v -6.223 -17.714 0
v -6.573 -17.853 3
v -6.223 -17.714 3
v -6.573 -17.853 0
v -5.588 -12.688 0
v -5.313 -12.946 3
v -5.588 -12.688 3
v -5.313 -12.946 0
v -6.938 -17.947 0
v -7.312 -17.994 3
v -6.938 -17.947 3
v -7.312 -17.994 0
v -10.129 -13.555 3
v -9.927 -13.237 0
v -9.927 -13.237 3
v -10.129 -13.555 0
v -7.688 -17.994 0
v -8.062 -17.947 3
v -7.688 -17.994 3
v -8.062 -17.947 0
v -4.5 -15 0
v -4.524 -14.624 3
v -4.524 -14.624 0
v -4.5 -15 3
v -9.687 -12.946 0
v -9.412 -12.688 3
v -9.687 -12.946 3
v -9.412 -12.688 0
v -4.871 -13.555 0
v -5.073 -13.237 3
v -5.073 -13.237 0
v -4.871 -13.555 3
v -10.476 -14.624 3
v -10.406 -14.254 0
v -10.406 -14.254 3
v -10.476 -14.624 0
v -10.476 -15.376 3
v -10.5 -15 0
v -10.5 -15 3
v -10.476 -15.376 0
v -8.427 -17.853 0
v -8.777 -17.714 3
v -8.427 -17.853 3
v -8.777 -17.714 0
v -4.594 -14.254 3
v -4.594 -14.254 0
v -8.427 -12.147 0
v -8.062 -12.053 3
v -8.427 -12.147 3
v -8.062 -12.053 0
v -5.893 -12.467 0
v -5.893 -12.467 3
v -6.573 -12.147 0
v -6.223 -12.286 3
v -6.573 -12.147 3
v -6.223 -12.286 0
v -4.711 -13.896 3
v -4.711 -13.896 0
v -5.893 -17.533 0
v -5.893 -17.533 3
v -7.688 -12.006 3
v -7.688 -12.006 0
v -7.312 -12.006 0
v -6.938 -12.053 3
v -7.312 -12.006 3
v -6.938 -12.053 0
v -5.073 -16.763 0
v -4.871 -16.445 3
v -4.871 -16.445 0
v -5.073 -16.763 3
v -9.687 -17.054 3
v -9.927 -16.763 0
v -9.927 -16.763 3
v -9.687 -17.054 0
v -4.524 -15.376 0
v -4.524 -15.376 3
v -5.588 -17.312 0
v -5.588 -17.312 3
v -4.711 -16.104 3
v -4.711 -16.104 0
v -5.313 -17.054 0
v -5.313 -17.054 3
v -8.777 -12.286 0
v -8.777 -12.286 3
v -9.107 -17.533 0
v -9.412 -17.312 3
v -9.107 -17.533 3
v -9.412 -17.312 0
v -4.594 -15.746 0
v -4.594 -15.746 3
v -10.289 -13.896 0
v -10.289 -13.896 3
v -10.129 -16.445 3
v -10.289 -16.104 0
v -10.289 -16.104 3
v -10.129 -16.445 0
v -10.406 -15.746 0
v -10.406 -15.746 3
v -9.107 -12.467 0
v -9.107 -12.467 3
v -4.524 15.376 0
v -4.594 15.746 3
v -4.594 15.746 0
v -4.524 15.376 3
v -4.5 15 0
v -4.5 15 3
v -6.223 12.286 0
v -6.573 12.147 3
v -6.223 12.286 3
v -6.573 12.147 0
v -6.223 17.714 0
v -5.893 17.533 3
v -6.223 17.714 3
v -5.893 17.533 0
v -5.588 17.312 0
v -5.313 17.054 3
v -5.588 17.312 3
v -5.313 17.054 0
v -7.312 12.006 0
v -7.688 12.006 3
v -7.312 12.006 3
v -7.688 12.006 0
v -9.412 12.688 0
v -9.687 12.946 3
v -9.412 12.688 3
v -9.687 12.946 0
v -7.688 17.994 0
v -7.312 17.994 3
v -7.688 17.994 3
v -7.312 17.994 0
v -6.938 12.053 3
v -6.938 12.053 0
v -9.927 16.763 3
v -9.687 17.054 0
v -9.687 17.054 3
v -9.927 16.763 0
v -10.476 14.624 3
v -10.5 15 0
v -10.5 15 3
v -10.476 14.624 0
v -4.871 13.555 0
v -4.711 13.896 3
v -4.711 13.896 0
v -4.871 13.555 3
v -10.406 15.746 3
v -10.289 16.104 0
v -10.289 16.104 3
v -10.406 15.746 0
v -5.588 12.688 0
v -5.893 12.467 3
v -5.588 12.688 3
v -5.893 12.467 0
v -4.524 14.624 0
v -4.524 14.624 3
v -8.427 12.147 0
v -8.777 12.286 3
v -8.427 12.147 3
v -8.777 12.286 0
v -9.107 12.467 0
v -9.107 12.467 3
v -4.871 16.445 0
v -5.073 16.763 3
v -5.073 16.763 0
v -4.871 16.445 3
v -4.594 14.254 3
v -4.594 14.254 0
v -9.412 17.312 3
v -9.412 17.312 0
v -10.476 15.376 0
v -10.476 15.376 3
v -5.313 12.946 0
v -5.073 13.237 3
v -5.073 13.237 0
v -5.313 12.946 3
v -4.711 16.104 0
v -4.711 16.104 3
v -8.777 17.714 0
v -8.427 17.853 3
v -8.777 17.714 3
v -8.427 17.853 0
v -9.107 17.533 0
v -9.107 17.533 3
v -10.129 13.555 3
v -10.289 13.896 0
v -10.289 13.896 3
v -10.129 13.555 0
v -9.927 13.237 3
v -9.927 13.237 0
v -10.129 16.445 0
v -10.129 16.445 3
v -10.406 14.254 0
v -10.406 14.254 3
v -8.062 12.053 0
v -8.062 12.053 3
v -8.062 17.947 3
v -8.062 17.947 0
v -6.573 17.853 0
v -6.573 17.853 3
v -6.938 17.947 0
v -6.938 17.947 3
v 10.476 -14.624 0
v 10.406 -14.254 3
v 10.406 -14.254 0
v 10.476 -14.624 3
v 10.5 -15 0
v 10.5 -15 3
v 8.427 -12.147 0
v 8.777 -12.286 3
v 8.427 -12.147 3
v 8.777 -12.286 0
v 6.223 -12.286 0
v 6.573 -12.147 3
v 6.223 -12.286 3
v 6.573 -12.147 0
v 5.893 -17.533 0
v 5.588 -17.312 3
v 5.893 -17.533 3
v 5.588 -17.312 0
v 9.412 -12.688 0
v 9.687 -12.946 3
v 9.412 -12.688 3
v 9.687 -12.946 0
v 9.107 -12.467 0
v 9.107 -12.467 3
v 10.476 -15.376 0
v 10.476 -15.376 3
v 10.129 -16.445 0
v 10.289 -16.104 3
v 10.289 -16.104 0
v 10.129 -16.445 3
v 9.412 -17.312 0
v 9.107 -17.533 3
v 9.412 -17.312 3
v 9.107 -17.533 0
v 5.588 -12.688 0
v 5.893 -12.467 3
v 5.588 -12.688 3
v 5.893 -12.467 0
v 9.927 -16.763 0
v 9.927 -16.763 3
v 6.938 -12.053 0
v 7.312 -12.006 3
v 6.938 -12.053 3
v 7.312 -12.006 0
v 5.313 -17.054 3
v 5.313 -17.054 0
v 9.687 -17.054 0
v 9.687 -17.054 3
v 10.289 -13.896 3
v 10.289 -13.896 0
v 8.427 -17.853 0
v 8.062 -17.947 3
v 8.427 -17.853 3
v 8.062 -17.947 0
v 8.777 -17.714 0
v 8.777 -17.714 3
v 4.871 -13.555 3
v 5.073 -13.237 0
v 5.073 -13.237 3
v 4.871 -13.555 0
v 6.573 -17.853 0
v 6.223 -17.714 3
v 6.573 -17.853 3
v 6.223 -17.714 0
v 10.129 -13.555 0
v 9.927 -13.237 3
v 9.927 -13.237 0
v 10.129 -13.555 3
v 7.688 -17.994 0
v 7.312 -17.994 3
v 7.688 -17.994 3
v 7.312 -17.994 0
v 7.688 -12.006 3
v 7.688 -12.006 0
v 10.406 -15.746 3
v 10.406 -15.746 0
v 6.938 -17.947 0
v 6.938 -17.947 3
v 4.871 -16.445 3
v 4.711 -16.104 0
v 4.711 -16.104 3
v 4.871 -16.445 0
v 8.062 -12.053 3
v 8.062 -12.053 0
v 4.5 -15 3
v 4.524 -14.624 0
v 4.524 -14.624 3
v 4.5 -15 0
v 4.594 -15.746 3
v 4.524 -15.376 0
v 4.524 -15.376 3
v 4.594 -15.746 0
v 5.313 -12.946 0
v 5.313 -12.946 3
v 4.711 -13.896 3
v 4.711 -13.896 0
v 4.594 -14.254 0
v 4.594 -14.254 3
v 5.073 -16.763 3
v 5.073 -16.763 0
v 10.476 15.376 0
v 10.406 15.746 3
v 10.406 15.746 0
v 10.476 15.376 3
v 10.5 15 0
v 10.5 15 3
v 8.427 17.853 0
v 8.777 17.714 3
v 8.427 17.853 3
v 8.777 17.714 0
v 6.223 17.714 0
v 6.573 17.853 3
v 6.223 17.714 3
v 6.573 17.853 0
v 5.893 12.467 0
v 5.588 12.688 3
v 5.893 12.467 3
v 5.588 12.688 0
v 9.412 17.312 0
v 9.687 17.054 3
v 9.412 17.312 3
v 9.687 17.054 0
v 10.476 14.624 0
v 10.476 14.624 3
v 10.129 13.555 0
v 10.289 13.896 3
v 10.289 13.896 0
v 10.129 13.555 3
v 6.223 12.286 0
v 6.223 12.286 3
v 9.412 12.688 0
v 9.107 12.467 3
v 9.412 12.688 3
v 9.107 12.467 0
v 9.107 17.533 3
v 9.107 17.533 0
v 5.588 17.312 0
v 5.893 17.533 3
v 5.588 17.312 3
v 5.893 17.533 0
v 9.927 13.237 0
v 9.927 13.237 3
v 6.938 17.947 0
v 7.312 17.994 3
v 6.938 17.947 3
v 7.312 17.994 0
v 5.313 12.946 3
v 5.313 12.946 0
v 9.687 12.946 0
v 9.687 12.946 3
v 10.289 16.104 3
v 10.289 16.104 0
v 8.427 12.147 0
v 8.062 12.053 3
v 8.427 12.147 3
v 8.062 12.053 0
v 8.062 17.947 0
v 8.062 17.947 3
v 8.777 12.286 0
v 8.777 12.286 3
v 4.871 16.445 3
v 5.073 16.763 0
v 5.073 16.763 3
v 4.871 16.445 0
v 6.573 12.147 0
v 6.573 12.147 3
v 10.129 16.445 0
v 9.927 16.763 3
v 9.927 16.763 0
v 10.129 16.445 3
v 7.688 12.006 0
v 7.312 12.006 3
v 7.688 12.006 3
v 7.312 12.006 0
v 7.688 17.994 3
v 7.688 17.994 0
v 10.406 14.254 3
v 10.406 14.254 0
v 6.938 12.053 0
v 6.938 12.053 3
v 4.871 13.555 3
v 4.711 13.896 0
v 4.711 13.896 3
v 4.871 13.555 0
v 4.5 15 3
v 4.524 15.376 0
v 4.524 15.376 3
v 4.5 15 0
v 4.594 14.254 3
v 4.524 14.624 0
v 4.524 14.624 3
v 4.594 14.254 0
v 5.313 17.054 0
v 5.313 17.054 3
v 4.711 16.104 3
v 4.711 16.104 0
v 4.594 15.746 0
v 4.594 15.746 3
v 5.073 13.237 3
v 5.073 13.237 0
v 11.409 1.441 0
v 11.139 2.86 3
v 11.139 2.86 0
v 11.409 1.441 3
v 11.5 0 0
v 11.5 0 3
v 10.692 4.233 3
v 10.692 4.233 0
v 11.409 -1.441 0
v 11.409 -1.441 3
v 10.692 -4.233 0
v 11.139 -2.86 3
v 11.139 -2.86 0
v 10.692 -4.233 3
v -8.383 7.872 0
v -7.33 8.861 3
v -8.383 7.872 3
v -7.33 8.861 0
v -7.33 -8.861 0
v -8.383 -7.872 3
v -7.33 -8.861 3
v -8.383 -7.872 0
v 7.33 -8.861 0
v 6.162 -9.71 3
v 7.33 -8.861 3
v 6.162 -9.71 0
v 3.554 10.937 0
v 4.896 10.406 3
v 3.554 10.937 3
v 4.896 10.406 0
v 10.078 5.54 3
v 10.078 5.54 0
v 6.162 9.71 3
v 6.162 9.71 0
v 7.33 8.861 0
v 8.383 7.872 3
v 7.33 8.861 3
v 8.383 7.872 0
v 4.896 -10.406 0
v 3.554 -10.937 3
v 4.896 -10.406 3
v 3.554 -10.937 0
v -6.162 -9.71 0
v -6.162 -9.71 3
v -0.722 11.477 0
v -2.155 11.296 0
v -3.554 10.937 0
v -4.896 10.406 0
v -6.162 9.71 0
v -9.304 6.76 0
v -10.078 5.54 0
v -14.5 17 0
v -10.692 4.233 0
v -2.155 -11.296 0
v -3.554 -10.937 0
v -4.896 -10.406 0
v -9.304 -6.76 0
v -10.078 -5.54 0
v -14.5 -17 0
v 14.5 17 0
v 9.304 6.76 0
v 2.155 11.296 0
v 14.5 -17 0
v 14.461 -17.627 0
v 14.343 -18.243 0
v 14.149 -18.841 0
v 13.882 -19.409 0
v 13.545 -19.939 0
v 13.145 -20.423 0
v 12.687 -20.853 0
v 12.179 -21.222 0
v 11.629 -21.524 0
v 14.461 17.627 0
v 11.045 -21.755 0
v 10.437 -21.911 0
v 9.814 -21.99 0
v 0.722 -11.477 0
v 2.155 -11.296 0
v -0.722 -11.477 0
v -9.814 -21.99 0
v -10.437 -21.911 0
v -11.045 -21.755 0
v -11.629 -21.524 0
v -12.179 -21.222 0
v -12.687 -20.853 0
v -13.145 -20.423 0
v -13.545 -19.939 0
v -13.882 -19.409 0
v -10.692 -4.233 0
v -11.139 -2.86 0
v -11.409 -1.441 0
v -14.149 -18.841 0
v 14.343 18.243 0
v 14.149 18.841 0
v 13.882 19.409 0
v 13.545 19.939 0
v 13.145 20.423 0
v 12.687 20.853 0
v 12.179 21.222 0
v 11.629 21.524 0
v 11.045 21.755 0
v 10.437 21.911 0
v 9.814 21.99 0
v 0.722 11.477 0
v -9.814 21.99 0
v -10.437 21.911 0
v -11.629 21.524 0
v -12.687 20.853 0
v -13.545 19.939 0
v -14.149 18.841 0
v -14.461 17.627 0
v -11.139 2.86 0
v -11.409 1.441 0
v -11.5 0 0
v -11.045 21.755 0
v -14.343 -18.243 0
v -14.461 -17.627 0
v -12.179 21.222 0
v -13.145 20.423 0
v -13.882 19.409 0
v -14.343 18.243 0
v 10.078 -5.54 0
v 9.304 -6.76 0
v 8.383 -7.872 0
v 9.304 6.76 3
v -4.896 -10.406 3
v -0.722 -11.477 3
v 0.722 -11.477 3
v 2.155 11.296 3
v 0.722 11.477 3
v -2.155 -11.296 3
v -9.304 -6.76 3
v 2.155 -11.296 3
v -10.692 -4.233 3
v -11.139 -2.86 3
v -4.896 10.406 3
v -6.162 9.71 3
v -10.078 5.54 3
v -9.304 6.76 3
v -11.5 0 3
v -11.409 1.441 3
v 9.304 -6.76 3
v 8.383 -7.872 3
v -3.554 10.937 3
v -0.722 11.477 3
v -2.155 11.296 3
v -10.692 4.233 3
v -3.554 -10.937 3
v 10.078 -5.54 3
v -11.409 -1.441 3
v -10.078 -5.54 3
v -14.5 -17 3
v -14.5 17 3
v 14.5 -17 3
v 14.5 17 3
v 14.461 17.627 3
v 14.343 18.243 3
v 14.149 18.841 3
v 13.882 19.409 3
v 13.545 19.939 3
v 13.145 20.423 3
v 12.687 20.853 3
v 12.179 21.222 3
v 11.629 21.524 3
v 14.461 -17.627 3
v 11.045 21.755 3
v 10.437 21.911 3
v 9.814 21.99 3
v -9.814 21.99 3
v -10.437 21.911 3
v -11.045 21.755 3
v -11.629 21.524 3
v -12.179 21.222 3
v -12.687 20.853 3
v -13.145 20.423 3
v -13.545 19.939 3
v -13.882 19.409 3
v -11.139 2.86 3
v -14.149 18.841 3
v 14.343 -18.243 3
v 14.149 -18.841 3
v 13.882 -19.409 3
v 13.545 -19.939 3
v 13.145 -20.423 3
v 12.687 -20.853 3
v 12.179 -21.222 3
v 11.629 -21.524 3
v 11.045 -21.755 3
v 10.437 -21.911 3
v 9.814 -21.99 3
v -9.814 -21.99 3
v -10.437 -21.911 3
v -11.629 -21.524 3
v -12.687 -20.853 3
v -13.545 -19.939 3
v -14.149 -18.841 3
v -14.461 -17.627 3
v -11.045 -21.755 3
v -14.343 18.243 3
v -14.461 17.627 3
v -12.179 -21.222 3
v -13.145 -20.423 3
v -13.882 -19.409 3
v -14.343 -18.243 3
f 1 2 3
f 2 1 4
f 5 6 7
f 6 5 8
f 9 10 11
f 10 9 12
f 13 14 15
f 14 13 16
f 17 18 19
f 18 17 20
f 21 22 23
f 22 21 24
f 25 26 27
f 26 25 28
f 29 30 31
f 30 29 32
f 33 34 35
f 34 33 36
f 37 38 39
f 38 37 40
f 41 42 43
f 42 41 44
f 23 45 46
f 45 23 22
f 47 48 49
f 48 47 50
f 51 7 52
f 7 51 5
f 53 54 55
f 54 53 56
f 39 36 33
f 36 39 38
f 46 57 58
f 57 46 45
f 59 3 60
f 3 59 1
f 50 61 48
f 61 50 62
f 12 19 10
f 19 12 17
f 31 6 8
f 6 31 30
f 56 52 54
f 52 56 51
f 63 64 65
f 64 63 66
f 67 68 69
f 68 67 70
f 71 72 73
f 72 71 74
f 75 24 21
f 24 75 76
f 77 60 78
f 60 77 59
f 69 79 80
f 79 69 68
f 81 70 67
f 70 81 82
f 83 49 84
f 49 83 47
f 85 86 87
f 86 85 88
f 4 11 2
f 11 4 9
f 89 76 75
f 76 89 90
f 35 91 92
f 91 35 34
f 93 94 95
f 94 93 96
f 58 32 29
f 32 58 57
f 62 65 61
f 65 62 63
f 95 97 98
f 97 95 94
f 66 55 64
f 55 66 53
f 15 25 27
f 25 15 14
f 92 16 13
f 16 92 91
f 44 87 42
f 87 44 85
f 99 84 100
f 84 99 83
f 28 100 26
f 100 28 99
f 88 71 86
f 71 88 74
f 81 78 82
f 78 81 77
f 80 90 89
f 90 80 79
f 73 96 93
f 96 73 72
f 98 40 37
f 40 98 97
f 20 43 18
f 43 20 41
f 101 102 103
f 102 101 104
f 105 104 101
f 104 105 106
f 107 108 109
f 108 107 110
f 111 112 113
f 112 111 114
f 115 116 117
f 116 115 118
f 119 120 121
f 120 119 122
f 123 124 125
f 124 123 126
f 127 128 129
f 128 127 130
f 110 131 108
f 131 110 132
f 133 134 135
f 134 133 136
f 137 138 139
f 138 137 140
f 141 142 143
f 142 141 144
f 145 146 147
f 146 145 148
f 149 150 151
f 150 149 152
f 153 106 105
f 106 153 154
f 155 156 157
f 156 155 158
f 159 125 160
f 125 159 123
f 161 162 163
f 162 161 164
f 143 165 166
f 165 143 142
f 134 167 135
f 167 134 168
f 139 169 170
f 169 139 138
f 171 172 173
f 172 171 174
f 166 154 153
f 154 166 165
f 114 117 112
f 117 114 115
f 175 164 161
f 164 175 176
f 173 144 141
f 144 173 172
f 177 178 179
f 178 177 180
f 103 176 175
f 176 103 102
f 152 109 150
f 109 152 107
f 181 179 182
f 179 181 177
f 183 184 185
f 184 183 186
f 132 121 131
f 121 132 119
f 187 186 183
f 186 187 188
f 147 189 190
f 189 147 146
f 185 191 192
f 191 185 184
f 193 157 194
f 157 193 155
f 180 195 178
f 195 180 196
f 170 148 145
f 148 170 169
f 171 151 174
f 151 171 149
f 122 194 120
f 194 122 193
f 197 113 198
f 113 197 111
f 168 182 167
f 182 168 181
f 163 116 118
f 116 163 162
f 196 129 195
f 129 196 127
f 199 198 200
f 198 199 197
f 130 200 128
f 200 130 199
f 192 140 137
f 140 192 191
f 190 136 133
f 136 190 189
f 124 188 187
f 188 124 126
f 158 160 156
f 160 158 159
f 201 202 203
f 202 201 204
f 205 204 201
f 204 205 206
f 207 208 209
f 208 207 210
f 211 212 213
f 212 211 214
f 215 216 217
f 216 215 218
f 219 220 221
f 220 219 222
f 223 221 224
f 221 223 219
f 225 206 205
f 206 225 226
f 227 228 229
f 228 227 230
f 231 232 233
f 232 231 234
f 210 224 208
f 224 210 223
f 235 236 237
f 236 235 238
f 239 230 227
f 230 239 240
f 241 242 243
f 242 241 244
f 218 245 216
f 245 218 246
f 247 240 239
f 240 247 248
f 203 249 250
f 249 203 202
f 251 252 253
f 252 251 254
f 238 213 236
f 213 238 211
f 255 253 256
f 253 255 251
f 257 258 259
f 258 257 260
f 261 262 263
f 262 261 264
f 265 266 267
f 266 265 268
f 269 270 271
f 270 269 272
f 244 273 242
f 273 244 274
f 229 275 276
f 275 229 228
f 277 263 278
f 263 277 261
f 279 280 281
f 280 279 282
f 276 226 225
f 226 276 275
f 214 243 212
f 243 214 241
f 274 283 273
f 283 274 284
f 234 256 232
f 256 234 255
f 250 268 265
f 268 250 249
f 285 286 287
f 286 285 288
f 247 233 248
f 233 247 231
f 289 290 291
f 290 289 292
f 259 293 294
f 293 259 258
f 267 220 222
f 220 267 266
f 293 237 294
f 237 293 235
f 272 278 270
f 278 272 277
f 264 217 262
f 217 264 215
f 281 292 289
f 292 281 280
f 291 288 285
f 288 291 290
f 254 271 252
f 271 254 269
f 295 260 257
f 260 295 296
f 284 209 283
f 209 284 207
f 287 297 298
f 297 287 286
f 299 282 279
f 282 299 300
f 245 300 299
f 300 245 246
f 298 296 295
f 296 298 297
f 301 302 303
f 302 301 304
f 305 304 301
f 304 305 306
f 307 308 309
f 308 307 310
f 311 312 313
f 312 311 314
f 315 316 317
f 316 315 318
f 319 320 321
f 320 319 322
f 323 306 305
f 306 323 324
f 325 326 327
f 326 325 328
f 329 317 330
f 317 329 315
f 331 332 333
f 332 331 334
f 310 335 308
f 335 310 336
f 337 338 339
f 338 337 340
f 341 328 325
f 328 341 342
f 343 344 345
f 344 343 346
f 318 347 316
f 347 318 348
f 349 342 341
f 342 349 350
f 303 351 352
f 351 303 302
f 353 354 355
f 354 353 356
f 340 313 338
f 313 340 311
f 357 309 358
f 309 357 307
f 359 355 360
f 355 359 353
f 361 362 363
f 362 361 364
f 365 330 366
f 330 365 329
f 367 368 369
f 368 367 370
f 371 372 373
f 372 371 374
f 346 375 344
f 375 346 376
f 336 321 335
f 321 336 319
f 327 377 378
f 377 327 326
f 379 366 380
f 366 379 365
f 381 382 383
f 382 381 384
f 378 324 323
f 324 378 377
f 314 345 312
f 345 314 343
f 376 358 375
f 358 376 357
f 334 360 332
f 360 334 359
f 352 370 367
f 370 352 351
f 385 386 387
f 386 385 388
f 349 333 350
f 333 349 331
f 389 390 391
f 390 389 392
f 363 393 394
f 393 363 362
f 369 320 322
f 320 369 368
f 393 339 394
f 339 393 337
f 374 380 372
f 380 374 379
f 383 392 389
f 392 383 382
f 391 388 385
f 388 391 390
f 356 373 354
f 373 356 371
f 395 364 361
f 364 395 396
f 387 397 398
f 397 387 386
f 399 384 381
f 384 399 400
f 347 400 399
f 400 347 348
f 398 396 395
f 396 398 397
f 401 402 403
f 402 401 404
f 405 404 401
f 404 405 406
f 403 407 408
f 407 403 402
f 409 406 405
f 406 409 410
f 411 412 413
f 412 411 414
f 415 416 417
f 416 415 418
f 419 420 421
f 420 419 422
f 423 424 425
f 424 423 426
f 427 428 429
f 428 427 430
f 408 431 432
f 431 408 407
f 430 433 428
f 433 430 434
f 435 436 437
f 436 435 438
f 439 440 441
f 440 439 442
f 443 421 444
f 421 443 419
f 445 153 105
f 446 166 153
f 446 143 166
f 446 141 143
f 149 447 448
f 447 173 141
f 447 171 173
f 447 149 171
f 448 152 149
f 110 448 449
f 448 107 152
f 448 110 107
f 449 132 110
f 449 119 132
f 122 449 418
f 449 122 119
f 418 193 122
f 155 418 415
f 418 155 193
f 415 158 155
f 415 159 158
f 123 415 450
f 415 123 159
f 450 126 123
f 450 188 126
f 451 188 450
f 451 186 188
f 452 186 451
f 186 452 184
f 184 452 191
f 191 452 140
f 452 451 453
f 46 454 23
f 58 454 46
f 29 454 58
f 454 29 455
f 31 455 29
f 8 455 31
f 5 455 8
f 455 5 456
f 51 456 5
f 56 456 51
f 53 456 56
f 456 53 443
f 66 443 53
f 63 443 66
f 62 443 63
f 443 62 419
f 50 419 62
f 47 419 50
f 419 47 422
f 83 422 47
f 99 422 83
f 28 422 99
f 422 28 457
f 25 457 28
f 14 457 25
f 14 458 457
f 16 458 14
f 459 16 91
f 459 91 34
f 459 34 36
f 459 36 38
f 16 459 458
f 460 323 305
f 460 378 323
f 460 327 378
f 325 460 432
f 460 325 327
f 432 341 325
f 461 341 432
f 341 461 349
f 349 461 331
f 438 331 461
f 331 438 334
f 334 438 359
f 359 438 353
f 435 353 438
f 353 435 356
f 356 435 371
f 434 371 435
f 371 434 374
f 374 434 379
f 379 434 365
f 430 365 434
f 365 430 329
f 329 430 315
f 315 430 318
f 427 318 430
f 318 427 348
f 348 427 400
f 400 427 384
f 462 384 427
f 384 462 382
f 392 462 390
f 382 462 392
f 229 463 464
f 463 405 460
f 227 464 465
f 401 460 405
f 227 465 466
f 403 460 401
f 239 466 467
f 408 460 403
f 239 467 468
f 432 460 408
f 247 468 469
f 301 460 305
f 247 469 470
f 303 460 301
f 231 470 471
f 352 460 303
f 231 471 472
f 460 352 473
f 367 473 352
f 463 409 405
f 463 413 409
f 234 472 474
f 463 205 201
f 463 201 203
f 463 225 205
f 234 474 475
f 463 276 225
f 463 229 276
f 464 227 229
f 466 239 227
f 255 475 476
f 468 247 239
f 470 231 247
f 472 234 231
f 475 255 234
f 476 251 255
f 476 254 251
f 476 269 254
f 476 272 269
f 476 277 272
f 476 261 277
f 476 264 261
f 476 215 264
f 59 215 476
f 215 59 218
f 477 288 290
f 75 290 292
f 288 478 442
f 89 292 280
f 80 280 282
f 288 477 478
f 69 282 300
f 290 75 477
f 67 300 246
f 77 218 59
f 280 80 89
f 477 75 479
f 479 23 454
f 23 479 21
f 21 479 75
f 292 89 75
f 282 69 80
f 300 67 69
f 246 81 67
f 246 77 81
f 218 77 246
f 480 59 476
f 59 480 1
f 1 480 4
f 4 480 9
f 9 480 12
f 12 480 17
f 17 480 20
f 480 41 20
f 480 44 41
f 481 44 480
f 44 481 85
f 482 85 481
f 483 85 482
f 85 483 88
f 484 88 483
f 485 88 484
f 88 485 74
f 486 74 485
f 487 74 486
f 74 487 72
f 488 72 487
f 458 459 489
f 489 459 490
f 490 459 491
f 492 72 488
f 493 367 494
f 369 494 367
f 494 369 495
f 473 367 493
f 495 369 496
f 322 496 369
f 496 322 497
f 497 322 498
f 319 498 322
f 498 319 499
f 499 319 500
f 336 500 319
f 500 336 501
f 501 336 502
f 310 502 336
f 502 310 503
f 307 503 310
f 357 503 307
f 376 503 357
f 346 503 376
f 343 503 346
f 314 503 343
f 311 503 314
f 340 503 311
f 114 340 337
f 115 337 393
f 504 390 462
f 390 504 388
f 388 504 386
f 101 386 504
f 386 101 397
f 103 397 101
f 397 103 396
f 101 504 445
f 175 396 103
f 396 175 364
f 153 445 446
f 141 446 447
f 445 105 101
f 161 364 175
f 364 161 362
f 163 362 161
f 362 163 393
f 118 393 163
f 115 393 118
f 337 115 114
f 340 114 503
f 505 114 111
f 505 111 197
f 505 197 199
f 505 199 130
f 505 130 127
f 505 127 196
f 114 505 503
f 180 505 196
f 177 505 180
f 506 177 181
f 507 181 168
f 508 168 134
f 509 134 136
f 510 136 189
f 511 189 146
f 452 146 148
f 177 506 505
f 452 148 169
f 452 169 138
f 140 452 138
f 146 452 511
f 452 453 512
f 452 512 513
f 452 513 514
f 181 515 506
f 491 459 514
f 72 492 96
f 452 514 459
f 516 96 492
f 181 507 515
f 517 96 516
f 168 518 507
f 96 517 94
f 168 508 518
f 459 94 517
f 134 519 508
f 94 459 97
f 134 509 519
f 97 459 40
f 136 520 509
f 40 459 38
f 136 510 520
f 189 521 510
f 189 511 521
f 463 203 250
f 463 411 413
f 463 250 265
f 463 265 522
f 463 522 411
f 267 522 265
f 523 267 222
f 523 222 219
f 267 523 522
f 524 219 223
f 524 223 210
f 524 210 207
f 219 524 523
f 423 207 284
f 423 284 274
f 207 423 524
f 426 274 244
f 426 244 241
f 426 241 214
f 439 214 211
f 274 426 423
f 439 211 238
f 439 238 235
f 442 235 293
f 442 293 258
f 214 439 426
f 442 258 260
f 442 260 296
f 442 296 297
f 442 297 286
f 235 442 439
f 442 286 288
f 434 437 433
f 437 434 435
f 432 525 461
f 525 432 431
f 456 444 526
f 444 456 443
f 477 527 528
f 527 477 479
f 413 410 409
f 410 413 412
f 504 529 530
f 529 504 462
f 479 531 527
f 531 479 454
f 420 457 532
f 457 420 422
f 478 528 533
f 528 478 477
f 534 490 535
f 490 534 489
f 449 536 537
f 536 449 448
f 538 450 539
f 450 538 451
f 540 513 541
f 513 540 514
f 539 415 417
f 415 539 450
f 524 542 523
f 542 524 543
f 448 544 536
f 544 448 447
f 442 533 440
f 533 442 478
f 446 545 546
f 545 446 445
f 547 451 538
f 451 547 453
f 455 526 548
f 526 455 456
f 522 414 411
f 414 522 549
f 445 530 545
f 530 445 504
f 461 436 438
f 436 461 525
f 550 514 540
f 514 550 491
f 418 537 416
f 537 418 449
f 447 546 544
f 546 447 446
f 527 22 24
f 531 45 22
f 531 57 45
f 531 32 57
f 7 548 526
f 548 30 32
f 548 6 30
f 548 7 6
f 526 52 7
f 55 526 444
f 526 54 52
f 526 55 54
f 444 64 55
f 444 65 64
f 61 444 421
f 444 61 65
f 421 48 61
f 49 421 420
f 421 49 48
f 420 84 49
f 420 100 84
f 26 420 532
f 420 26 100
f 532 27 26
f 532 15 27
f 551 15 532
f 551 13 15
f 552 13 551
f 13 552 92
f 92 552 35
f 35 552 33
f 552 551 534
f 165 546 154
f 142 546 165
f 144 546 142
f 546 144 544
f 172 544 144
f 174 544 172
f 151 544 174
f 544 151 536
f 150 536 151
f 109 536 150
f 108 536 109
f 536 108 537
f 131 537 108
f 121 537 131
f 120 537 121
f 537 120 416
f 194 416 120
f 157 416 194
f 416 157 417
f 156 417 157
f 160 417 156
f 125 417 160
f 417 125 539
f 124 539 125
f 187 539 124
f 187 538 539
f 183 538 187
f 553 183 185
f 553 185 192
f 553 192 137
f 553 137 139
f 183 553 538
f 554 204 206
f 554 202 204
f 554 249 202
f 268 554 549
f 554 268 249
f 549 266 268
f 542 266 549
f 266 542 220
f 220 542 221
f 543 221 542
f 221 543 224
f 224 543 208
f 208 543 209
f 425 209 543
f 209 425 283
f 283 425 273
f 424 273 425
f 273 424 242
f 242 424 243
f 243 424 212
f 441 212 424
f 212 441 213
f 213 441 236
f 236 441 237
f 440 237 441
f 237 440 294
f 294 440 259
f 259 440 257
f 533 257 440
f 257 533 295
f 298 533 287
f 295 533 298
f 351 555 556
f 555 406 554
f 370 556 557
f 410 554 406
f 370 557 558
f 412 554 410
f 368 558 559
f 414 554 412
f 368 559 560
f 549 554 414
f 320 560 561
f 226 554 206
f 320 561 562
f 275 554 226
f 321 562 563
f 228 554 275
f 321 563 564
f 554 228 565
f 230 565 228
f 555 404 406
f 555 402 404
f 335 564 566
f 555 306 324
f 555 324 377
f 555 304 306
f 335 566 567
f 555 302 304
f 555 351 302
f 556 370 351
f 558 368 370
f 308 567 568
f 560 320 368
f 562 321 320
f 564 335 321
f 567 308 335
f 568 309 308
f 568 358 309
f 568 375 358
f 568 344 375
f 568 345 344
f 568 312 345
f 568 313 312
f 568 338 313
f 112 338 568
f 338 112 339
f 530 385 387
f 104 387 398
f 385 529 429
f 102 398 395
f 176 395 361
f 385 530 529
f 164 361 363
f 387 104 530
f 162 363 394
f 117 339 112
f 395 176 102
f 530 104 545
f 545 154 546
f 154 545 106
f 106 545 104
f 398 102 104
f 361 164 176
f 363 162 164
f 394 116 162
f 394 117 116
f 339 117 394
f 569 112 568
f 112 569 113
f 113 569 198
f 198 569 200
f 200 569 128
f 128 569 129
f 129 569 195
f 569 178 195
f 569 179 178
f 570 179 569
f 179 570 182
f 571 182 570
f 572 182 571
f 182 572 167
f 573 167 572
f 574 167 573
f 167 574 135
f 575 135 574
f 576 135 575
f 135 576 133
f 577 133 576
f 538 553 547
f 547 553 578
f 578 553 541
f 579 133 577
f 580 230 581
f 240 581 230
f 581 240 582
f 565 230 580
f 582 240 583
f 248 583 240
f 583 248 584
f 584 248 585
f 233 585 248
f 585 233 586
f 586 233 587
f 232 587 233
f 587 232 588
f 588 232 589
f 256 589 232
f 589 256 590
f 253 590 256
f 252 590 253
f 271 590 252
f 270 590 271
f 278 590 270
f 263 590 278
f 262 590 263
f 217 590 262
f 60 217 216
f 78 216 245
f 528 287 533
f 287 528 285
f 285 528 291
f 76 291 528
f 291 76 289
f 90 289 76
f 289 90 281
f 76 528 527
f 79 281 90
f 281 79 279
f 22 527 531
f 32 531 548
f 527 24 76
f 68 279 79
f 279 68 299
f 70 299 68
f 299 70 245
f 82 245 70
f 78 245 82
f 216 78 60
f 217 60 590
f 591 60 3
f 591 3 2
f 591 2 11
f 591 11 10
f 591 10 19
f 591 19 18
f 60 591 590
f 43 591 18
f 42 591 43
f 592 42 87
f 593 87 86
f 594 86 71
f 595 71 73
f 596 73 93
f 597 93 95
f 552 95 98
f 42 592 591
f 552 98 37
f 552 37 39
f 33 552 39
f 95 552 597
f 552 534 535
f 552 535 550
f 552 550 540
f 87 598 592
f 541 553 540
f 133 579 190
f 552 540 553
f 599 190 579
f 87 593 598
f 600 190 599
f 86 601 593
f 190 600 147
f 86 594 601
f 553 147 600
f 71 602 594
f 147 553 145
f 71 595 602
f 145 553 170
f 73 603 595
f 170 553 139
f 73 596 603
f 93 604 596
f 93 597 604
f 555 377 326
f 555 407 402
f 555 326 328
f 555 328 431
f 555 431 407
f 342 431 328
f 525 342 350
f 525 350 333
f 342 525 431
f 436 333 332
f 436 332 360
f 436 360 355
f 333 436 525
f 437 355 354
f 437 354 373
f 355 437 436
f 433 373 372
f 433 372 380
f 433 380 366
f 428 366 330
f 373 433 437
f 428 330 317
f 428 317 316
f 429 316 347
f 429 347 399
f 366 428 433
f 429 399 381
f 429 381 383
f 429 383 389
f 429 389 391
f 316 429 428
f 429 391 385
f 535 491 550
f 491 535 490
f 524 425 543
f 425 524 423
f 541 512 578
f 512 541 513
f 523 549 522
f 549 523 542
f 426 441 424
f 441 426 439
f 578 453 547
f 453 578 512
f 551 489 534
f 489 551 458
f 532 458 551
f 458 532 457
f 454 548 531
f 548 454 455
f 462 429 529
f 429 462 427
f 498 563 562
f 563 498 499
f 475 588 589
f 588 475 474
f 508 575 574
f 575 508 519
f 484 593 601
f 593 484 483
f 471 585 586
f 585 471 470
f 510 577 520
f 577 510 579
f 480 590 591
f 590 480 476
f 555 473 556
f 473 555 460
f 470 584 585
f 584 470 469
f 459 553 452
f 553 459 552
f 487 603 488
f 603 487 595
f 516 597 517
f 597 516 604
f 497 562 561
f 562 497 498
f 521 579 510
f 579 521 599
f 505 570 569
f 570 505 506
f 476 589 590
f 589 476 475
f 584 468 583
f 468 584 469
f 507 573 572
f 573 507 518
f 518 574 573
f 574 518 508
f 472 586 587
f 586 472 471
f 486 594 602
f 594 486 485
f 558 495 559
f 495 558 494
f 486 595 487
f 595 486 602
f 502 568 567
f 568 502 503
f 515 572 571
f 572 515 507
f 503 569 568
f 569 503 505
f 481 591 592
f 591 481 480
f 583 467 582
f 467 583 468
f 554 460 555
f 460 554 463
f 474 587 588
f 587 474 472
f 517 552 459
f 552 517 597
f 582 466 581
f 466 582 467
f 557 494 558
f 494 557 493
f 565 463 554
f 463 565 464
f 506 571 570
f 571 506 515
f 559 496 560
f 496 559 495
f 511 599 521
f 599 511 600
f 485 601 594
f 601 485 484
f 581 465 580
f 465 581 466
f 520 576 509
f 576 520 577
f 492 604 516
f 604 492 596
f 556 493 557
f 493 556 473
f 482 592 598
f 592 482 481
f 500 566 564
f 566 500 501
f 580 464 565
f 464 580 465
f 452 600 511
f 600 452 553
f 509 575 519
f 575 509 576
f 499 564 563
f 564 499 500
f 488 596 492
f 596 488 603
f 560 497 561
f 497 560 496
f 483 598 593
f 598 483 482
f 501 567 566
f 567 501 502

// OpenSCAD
$fn = 50;


difference() {
	union() {
		hull() {
			translate(v = [-9.5000000000, 17.0000000000, 0]) {
				cylinder(h = 3, r = 5);
			}
			translate(v = [9.5000000000, 17.0000000000, 0]) {
				cylinder(h = 3, r = 5);
			}
			translate(v = [-9.5000000000, -17.0000000000, 0]) {
				cylinder(h = 3, r = 5);
			}
			translate(v = [9.5000000000, -17.0000000000, 0]) {
				cylinder(h = 3, r = 5);
			}
		}
	}
	union() {
		#translate(v = [-7.5000000000, -15.0000000000, -100.0000000000]) {
			cylinder(h = 200, r = 3.0000000000);
		}
		#translate(v = [-7.5000000000, 15.0000000000, -100.0000000000]) {
			cylinder(h = 200, r = 3.0000000000);
		}
		#translate(v = [7.5000000000, -15.0000000000, -100.0000000000]) {
			cylinder(h = 200, r = 3.0000000000);
		}
		#translate(v = [7.5000000000, 15.0000000000, -100.0000000000]) {
			cylinder(h = 200, r = 3.0000000000);
		}
		#cylinder(h = 3, r = 11.5000000000);
	}
}
